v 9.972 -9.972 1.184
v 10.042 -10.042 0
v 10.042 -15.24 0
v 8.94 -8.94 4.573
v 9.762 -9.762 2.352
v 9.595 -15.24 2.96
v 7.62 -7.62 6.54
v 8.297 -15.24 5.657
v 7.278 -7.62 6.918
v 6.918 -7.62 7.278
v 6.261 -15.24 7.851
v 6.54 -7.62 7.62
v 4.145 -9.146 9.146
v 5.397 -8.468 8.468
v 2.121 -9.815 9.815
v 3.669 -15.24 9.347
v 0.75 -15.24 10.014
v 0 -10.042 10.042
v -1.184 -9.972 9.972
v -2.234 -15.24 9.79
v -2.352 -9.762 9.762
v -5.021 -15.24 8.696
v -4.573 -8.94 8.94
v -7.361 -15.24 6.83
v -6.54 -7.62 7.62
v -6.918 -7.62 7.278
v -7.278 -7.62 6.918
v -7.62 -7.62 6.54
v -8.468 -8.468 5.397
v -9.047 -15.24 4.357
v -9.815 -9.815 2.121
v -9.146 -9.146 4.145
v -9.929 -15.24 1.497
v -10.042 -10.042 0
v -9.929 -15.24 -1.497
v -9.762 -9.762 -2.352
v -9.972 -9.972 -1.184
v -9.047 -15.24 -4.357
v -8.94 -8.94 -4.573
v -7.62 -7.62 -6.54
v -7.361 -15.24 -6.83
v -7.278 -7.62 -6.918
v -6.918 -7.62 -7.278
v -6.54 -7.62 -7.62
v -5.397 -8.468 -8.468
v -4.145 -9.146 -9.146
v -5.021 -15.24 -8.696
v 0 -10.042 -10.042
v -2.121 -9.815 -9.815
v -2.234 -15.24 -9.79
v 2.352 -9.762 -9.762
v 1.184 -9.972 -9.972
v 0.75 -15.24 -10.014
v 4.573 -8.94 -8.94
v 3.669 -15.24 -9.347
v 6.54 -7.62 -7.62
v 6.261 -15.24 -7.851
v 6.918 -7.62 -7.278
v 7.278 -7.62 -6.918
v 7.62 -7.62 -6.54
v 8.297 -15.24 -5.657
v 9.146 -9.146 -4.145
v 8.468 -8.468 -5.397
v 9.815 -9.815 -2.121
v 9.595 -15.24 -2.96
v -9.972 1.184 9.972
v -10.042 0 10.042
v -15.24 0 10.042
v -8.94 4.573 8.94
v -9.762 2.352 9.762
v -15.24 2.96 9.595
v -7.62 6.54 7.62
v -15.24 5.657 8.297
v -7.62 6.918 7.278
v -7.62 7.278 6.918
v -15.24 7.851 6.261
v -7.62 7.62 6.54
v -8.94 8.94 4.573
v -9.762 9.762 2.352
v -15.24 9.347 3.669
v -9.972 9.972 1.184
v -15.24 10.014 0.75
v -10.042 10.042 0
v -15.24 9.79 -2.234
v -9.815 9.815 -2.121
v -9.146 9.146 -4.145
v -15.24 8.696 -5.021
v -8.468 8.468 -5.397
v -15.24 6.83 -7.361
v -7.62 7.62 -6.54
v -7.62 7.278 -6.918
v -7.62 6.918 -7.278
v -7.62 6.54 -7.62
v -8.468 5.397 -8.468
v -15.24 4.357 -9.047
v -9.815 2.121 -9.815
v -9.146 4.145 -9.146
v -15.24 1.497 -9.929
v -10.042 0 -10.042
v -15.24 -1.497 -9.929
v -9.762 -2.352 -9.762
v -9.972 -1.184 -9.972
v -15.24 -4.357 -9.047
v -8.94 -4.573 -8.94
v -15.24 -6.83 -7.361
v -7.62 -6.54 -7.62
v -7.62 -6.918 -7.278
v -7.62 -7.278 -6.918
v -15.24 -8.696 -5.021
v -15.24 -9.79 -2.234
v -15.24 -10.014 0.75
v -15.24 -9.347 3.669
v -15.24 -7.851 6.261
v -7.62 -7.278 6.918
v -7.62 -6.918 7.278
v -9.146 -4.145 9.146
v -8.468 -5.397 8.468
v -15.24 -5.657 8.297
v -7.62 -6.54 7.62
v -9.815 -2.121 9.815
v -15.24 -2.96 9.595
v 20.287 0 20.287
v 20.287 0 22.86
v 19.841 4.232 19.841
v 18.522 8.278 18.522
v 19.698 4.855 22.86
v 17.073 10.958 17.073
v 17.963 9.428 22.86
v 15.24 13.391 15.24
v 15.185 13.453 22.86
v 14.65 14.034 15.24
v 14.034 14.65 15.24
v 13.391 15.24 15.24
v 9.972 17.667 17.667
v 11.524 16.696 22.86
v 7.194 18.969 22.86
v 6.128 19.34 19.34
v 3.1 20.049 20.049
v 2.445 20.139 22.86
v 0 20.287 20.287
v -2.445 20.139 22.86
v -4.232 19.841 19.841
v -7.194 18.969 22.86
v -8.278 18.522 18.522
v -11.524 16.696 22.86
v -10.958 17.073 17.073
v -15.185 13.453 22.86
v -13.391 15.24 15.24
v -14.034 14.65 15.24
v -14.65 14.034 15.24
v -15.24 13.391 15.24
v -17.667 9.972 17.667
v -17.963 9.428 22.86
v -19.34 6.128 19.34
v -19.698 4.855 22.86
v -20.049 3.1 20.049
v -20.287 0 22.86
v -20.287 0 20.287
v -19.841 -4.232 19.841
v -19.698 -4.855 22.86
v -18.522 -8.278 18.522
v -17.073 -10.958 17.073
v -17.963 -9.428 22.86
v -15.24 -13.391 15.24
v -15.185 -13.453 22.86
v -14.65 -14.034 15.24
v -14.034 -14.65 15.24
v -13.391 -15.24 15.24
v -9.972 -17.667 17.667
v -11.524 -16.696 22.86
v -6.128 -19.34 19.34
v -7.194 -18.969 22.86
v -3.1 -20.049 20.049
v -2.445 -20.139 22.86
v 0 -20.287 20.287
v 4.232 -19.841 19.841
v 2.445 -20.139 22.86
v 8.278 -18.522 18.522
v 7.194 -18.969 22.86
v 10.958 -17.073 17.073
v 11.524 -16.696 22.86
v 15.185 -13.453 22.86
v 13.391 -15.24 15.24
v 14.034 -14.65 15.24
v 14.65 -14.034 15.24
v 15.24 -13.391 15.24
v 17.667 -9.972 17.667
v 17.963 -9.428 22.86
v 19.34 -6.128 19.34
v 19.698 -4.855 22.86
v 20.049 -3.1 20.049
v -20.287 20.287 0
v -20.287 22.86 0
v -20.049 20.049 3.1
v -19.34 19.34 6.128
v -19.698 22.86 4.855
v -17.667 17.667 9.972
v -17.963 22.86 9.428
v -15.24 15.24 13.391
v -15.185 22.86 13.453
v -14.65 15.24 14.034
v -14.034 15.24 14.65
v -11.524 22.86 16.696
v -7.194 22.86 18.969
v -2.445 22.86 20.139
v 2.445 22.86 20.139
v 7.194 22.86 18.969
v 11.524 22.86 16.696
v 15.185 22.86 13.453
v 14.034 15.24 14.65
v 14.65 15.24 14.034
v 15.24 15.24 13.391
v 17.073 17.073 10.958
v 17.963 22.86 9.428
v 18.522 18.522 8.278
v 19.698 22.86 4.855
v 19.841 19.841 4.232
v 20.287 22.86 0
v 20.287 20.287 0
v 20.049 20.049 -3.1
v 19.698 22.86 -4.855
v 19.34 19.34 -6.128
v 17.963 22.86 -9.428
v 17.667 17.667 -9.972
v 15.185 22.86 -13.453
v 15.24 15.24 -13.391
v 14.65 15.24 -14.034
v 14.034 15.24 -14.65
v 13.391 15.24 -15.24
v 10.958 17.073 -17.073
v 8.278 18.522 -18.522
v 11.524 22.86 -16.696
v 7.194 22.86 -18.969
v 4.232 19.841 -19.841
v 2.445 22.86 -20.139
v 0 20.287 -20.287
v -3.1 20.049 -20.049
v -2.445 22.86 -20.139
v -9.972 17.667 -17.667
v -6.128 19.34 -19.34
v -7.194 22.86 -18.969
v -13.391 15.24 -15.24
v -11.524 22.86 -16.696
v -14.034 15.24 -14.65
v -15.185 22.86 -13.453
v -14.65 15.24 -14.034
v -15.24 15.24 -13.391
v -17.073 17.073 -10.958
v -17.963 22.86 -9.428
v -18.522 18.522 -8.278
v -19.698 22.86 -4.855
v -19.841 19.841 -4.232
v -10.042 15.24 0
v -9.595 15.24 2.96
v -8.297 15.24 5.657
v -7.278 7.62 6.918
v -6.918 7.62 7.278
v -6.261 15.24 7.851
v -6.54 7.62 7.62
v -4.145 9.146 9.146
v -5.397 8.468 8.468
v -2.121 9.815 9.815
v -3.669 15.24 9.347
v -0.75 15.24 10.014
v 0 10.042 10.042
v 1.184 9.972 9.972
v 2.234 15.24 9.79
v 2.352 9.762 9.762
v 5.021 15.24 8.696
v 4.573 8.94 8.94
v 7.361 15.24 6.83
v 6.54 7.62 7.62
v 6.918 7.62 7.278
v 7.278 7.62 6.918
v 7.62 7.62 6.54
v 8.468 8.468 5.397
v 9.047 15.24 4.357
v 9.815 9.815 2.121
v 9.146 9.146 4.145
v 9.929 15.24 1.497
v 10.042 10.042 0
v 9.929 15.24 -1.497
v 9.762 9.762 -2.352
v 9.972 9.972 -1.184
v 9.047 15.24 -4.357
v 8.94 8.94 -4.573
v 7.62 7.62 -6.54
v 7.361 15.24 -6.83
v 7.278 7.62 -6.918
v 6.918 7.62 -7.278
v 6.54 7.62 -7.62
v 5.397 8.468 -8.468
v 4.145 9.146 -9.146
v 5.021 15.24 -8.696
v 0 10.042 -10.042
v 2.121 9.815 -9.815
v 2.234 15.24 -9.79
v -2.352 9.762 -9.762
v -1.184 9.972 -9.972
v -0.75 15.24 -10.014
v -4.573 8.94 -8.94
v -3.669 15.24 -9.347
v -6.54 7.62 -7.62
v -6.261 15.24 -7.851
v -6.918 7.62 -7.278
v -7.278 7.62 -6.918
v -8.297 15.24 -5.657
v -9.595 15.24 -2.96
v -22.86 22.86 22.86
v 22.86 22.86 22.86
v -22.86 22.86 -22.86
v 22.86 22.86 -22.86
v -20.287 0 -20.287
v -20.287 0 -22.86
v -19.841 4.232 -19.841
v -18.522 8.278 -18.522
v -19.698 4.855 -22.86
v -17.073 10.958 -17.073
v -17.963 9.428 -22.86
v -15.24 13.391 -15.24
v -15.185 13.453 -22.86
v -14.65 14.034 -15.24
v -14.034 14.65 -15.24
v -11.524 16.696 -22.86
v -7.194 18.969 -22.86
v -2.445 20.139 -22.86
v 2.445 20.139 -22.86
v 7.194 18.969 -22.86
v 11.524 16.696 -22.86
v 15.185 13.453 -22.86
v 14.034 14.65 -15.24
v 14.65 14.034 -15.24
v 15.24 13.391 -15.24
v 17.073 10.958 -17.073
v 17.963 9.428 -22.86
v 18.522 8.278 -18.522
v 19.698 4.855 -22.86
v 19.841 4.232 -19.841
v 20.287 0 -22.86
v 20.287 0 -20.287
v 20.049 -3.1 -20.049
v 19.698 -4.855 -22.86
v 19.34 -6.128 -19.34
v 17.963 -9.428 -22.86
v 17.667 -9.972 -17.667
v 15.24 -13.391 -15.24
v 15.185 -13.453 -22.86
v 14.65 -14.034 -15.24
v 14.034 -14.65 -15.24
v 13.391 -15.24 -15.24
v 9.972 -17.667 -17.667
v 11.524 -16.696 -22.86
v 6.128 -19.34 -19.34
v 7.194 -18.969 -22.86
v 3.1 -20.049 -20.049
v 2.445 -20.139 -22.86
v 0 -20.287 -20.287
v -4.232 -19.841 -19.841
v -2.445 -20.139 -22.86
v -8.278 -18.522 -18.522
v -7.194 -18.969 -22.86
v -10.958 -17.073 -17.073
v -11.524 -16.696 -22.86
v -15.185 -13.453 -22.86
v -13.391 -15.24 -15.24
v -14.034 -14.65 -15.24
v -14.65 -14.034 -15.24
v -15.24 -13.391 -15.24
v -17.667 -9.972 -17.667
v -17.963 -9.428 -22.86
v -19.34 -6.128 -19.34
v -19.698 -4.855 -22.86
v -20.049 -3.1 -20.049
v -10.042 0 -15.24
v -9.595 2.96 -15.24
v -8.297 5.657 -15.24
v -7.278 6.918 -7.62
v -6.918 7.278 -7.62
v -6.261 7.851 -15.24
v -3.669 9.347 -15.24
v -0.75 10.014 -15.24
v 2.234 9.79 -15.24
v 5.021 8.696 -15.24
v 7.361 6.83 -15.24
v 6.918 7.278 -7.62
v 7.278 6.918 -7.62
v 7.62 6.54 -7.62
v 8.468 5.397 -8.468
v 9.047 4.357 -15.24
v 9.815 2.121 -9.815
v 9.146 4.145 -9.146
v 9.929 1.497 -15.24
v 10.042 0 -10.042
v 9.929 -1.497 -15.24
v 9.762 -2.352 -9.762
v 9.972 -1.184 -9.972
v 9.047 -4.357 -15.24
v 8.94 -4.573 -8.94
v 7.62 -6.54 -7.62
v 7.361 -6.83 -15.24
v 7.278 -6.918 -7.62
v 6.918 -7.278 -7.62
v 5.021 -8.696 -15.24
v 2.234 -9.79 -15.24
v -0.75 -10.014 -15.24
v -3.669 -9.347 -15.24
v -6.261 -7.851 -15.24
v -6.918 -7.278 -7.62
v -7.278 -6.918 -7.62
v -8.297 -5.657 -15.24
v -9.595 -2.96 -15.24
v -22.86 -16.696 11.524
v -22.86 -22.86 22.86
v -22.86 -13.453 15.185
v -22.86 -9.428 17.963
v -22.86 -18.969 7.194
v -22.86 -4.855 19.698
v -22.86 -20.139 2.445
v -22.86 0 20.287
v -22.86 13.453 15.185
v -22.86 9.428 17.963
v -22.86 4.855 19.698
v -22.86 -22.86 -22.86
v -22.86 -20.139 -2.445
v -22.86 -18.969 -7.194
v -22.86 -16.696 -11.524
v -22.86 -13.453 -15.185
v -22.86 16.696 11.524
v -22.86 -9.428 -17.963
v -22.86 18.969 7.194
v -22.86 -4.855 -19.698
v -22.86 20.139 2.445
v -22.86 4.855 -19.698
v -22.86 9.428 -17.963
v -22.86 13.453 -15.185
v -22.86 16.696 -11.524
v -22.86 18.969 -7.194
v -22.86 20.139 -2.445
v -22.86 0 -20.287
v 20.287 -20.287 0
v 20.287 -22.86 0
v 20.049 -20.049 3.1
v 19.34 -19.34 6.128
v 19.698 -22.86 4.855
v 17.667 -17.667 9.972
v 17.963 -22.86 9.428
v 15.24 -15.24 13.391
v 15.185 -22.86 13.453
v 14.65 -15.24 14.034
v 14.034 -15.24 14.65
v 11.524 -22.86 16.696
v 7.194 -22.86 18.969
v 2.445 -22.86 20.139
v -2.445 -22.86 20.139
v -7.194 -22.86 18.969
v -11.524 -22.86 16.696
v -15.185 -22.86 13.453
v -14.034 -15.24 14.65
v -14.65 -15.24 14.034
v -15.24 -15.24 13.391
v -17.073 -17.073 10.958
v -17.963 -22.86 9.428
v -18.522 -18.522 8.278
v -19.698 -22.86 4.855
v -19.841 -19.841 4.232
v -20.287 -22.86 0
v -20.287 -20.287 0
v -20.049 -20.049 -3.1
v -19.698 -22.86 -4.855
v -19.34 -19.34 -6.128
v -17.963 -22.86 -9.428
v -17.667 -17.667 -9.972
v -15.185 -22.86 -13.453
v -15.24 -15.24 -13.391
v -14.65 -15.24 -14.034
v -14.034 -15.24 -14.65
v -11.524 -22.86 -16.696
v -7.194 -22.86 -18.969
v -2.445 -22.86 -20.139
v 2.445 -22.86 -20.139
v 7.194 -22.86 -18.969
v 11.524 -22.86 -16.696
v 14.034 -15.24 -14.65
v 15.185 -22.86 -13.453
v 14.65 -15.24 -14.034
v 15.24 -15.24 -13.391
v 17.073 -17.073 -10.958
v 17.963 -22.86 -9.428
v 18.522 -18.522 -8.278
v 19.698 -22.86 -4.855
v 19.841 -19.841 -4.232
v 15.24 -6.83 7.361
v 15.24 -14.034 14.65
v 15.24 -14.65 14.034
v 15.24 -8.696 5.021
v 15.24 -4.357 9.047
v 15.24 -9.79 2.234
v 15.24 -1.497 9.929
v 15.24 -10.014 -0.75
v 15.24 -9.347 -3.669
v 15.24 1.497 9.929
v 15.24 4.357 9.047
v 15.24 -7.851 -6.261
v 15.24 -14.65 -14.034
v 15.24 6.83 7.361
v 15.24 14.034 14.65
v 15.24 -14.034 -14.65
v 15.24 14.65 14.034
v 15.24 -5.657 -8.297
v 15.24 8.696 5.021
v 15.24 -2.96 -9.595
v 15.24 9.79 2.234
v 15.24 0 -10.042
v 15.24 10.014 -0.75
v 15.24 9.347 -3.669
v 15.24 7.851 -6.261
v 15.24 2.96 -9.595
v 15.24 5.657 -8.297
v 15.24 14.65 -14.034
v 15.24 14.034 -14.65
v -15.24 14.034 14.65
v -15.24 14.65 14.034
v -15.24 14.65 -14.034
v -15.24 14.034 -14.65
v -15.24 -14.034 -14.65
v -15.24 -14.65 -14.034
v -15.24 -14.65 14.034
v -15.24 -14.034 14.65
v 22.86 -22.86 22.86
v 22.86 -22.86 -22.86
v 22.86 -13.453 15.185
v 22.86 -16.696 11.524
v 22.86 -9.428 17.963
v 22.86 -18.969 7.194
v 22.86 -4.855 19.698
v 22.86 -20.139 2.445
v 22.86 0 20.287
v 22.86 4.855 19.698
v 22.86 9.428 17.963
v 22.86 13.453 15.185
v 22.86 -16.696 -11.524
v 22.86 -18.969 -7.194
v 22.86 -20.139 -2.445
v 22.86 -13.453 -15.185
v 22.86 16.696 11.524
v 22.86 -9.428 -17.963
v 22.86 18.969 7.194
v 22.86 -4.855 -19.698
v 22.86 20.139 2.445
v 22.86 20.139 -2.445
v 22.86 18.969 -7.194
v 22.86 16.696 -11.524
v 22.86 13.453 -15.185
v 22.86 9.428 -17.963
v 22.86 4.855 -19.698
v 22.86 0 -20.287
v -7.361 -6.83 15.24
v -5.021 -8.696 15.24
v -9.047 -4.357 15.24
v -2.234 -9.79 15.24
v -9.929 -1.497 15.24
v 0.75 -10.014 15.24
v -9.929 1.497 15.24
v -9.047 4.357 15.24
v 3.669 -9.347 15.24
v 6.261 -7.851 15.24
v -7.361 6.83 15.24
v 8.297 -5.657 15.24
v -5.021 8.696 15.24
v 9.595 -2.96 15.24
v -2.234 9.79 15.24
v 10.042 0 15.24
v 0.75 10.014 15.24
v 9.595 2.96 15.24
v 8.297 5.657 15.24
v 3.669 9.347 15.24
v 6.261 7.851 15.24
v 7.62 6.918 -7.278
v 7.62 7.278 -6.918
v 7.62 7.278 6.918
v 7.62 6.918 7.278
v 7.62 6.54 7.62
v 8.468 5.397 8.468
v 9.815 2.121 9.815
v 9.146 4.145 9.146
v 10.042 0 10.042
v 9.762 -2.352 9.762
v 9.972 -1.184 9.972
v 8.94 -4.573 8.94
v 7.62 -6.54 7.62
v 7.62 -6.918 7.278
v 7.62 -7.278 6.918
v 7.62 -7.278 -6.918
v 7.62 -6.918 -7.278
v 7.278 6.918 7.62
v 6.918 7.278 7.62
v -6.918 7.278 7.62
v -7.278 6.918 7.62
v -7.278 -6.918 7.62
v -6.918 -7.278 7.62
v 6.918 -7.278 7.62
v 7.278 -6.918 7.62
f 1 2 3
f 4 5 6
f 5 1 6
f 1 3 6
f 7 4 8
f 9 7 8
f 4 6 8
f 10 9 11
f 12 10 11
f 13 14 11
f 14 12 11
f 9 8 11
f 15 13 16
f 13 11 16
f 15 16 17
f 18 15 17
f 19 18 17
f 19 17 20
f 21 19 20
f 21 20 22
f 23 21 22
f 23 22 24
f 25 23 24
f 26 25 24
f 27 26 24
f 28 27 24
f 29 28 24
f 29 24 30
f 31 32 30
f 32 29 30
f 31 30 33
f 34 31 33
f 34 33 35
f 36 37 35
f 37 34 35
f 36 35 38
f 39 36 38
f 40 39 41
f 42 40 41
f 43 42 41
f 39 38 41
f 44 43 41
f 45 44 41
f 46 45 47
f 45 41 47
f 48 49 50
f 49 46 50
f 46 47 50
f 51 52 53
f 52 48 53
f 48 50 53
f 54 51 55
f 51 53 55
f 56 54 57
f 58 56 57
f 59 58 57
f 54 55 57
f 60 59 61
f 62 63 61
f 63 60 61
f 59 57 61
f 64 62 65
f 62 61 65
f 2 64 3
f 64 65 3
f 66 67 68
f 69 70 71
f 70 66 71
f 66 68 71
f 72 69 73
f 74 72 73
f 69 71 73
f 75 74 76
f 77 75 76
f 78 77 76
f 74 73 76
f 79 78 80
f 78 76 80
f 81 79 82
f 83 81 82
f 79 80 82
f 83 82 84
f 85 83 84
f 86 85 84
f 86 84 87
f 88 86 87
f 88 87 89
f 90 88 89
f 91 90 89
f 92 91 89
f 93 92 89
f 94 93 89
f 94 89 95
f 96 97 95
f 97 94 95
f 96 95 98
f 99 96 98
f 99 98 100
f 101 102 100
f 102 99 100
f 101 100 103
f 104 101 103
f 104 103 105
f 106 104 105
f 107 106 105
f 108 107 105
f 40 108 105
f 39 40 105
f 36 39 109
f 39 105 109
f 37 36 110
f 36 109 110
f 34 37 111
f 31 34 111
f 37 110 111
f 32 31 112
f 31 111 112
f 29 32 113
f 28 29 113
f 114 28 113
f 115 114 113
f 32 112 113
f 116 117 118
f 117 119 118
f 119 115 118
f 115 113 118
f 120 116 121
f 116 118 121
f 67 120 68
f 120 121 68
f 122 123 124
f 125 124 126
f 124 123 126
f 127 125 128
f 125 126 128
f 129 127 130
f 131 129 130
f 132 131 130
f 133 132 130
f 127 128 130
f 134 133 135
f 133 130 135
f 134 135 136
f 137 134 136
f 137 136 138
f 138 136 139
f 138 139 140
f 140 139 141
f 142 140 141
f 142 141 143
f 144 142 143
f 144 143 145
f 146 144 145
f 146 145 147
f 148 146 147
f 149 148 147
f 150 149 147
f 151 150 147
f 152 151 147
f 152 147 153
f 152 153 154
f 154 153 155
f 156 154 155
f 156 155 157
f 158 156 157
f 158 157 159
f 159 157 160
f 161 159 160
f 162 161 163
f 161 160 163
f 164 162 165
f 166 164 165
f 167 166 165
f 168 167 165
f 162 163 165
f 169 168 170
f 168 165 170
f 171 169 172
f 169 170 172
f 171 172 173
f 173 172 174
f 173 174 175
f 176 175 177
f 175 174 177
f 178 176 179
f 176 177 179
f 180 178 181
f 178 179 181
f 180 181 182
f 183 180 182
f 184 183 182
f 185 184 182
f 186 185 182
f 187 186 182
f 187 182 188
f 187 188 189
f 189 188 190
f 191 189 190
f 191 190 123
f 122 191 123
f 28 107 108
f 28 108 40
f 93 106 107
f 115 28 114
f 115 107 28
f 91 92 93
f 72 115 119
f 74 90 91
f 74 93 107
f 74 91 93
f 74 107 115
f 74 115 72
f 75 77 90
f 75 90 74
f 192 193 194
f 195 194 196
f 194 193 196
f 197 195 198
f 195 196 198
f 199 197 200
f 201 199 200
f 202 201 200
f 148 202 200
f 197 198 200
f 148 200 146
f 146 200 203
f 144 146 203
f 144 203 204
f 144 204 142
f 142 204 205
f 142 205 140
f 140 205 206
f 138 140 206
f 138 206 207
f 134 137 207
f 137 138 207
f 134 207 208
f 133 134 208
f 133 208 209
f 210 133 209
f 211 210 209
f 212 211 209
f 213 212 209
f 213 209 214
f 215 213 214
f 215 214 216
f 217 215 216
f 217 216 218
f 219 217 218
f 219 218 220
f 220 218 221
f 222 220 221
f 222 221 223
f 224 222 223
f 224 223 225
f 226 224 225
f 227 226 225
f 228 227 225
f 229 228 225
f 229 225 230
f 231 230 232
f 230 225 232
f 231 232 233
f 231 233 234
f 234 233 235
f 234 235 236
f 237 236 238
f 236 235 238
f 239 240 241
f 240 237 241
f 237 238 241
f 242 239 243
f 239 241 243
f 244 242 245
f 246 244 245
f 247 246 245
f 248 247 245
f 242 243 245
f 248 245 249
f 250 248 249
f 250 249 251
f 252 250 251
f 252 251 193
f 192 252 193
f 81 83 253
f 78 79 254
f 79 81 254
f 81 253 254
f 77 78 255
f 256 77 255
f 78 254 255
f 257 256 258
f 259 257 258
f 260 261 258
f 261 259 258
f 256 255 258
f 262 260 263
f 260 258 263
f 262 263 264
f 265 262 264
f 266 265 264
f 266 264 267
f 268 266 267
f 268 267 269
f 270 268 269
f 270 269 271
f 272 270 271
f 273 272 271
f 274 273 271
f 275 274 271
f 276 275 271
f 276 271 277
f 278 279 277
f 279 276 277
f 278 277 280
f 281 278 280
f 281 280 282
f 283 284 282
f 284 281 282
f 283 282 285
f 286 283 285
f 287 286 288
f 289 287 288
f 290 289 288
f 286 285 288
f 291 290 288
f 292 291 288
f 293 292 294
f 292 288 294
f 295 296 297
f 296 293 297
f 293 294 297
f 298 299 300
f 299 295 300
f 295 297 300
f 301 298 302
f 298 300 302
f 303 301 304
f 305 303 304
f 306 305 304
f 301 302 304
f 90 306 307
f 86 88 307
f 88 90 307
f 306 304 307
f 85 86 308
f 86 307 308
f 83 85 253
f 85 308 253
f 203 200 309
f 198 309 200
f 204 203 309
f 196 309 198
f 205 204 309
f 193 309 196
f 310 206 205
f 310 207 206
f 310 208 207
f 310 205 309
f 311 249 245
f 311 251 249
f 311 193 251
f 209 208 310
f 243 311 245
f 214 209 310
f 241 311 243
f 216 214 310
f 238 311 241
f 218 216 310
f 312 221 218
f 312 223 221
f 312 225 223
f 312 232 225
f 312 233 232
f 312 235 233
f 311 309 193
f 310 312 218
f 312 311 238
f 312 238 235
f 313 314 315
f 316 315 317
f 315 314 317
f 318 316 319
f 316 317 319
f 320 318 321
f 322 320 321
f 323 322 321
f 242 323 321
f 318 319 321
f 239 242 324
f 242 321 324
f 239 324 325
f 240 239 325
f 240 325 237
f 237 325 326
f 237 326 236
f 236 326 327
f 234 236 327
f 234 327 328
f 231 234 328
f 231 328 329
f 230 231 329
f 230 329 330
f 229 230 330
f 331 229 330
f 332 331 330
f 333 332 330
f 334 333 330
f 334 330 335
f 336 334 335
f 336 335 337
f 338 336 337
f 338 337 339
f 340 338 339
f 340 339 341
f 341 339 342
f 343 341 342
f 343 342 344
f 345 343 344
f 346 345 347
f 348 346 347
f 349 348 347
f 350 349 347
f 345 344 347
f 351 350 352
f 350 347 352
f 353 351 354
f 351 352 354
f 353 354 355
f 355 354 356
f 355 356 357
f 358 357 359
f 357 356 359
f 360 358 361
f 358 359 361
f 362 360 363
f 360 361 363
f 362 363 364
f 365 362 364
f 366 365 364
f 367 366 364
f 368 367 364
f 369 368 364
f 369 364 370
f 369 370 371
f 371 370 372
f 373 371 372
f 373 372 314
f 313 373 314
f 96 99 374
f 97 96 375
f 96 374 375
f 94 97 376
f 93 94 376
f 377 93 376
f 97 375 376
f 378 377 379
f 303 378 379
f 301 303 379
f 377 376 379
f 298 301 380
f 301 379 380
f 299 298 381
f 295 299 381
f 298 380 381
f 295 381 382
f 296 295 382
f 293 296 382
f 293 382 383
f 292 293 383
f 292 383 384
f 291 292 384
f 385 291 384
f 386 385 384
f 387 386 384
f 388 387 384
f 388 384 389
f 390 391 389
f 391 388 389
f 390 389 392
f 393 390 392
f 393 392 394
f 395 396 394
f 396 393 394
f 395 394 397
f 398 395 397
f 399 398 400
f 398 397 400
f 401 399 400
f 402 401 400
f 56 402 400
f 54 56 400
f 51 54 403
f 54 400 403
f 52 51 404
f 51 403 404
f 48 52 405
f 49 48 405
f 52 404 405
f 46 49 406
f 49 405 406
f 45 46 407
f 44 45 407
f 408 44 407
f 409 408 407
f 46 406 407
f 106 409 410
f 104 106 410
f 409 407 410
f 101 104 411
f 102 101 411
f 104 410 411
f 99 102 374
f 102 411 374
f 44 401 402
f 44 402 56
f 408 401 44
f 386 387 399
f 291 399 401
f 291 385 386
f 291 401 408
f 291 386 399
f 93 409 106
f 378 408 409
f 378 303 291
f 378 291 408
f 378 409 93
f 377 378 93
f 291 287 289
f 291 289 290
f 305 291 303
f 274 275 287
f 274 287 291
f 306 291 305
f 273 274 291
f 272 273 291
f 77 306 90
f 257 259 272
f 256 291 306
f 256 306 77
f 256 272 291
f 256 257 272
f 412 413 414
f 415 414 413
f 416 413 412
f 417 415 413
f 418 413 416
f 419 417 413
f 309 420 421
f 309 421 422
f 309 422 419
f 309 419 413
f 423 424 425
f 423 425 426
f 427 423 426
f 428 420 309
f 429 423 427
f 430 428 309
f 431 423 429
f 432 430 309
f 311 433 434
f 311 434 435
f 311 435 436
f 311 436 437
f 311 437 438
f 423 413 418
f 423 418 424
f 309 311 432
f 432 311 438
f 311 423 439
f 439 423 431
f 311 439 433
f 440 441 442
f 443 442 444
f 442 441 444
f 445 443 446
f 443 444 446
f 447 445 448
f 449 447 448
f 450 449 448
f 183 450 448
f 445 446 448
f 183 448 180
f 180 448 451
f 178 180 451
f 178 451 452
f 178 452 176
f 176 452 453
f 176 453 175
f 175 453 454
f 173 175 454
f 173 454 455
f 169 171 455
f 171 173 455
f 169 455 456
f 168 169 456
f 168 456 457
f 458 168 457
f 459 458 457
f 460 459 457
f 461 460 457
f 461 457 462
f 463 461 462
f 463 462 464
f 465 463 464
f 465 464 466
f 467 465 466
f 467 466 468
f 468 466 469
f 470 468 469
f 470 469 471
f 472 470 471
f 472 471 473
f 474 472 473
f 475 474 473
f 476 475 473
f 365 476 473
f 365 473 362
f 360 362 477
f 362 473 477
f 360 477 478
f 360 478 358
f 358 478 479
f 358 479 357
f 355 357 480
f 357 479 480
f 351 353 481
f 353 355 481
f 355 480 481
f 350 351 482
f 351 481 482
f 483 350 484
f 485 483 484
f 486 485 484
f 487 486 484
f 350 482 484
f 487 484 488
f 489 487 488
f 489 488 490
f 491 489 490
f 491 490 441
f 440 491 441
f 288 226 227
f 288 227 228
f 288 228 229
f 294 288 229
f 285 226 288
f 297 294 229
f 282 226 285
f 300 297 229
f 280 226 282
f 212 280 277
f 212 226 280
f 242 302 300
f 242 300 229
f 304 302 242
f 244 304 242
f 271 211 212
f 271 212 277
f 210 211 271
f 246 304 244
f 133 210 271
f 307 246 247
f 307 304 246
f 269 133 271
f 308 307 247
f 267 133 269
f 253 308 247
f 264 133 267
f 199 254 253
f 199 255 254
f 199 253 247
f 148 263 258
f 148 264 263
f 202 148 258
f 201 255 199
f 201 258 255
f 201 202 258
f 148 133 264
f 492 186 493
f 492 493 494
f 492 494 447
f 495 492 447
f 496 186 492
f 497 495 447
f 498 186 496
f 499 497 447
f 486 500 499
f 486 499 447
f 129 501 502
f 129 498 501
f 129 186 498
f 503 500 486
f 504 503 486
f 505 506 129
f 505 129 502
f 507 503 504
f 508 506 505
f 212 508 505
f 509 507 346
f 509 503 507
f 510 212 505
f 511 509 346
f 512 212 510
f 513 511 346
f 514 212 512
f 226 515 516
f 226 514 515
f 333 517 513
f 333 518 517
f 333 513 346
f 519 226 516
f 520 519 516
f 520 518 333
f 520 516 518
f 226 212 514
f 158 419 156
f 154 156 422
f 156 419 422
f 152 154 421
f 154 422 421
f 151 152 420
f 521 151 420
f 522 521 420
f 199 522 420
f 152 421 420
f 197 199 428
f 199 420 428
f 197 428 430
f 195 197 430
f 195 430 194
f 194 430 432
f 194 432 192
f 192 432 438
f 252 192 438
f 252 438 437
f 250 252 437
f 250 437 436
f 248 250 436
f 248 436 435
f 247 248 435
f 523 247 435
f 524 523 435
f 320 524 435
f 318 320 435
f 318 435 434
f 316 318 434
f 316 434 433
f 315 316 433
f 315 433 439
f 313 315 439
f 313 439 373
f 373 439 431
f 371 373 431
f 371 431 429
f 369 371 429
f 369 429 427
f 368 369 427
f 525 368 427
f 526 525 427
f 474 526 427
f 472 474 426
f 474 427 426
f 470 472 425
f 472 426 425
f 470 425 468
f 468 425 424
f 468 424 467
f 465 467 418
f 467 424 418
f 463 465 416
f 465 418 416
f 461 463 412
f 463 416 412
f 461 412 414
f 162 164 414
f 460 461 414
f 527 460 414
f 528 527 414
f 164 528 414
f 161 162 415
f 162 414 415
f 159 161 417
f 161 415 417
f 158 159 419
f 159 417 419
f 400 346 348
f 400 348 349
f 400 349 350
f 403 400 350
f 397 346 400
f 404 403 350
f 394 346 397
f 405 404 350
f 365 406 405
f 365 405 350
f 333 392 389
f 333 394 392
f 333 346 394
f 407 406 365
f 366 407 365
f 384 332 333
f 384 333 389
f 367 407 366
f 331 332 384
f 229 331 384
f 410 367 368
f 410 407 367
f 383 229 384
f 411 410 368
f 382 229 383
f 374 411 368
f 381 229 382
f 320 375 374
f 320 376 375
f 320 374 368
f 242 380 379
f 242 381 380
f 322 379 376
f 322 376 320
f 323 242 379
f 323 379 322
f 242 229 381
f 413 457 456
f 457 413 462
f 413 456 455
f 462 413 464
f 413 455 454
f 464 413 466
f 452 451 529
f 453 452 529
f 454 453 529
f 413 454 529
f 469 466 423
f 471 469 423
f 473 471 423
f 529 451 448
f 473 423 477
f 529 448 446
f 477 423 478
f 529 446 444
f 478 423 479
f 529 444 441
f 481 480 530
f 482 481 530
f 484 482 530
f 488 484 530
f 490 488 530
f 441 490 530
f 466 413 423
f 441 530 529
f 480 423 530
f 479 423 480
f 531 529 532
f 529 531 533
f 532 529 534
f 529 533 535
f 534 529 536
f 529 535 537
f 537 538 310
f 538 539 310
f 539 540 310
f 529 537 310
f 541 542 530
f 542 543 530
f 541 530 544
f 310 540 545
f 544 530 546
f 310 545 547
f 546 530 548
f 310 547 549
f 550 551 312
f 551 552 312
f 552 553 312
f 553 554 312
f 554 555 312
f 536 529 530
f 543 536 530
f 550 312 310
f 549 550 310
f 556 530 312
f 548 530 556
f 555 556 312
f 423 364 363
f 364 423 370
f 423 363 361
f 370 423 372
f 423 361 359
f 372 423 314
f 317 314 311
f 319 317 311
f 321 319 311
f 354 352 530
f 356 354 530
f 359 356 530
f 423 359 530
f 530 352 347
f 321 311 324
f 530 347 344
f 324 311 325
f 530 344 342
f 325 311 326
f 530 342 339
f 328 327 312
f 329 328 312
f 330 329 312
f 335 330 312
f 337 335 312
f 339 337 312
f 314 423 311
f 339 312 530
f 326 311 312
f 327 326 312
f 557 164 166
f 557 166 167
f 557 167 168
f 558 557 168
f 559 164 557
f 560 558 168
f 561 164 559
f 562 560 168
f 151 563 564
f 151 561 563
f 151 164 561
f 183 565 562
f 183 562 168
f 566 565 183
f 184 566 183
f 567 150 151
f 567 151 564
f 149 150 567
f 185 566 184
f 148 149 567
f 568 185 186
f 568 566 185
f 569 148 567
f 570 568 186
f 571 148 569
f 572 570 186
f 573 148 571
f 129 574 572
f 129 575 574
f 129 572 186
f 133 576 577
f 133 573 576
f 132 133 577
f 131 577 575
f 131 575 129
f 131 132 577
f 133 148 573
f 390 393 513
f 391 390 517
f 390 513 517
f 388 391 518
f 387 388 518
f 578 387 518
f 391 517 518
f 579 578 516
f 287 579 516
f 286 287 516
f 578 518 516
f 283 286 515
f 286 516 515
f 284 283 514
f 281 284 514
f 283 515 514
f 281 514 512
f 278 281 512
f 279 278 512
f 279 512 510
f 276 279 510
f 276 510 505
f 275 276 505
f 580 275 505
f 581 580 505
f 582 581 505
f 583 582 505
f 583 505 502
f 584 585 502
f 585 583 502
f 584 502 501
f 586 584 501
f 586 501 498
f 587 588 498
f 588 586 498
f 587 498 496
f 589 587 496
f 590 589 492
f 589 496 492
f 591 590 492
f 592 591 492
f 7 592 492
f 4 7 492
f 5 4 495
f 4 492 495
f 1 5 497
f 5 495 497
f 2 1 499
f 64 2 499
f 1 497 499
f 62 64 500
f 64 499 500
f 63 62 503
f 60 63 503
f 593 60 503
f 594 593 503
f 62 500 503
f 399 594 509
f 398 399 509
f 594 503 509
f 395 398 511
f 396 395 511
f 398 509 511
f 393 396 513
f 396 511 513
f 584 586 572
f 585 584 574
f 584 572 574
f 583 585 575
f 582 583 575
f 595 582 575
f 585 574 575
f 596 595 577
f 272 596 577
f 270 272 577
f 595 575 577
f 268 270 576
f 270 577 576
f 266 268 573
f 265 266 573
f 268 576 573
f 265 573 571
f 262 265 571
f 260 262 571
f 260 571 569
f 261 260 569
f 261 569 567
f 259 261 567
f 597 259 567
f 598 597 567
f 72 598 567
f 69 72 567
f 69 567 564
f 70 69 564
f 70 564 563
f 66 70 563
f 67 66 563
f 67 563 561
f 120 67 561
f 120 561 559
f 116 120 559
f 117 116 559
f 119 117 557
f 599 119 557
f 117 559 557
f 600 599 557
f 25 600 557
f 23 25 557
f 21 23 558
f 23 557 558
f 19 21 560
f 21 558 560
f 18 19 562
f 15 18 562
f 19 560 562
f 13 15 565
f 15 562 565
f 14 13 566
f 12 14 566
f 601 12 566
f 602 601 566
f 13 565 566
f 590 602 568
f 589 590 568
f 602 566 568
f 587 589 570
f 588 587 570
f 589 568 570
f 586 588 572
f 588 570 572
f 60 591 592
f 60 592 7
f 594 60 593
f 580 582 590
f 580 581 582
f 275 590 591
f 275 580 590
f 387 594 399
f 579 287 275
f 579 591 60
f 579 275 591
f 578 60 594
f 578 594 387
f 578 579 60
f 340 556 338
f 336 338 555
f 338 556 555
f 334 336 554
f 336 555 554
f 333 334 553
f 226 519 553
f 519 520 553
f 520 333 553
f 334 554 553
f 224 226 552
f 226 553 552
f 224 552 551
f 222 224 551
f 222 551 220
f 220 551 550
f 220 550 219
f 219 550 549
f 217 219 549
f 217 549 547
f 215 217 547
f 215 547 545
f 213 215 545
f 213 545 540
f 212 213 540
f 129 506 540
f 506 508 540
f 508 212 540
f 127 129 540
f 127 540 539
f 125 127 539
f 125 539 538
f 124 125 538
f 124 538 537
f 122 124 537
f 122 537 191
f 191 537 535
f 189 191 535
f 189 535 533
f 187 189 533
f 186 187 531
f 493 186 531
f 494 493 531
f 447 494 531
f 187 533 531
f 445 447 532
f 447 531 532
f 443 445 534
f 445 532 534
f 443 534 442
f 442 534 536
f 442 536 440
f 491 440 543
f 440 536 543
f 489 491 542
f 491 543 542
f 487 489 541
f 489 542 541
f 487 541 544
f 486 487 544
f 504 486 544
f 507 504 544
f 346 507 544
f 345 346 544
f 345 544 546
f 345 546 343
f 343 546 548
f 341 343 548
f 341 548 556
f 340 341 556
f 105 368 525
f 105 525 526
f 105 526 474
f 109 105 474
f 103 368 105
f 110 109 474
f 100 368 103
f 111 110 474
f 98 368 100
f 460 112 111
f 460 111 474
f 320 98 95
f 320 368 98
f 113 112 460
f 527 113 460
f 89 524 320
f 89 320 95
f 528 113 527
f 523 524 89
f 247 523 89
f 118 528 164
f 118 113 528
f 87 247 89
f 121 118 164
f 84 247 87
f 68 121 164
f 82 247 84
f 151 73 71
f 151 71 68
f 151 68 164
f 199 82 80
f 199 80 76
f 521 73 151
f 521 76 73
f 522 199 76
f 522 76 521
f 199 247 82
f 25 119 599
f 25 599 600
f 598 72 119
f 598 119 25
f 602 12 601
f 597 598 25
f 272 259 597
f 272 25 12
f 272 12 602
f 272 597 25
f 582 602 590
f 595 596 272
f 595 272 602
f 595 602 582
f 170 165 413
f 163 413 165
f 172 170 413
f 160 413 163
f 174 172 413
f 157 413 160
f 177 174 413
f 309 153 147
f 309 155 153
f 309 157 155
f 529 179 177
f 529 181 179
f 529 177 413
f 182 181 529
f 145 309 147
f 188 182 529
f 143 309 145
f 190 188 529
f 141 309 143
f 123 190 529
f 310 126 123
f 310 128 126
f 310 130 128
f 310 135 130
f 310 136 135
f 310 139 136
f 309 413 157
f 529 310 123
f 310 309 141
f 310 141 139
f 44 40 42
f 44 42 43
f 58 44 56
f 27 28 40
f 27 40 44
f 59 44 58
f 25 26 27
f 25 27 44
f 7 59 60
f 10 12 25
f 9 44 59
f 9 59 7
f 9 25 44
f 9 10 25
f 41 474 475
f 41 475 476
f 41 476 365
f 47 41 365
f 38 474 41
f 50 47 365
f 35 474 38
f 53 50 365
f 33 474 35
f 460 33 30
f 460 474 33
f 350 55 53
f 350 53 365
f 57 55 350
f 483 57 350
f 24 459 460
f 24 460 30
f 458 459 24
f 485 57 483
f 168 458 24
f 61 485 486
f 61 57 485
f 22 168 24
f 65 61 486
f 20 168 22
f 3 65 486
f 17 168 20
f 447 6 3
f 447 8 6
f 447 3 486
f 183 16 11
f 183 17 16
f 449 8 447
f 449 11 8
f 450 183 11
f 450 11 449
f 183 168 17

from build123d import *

# Parameters (mm, degrees)
BOSS_EXTRUDE1_DEPTH         = 22.86
BOSS_EXTRUDE1_DEPTH_BACK    = 22.86
SKETCH1_W                   = 45.72
SKETCH1_H                   = 45.72
SKETCH4_R                   = 20.287199642
CUT_EXTRUDE1_DEPTH          = 7.62
SKETCH5_R                   = 10.041617815
CUT_EXTRUDE2_DEPTH          = 15.24
CIRPATTERN1_COUNT           = 4
CIRPATTERN2_COPY_1_SKETCH_R = 20.287199642
CIRPATTERN2_COPY_1_DEPTH    = 7.62
CIRPATTERN2_COPY_2_SKETCH_R = 20.287199642
CIRPATTERN2_COPY_2_DEPTH    = 7.62
CIRPATTERN2_COPY_3_SKETCH_R = 20.287199642
CIRPATTERN2_COPY_3_DEPTH    = 7.62
CIRPATTERN2_COPY_4_SKETCH_R = 10.041617815
CIRPATTERN2_COPY_4_DEPTH    = 15.24
CIRPATTERN2_COPY_5_SKETCH_R = 10.041617815
CIRPATTERN2_COPY_5_DEPTH    = 15.24
CIRPATTERN2_COPY_6_SKETCH_R = 10.041617815
CIRPATTERN2_COPY_6_DEPTH    = 15.24
CIRPATTERN2_COPY_7_SKETCH_R = 20.287199642
CIRPATTERN2_COPY_7_DEPTH    = 7.62
CIRPATTERN2_COPY_8_SKETCH_R = 10.041617815
CIRPATTERN2_COPY_8_DEPTH    = 15.24


with BuildPart() as part:
    # Sketch1 → Boss-Extrude1 (new, two sides: drawn at the far end of the back side and taken through both)
    with BuildSketch(Plane.XY.offset(-BOSS_EXTRUDE1_DEPTH_BACK)):
        Rectangle(SKETCH1_W, SKETCH1_H)
    extrude(amount=BOSS_EXTRUDE1_DEPTH + BOSS_EXTRUDE1_DEPTH_BACK)

    # Sketch4 → Cut-Extrude1 (cut)
    with BuildSketch(Plane.XY.offset(22.86)):
        Circle(SKETCH4_R)
    cut_extrude1 = extrude(amount=-CUT_EXTRUDE1_DEPTH, mode=Mode.SUBTRACT)

    # Sketch5 → Cut-Extrude2 (cut)
    with BuildSketch(Plane.XY.offset(22.86)):
        Circle(SKETCH5_R)
    cut_extrude2 = extrude(amount=-CUT_EXTRUDE2_DEPTH, mode=Mode.SUBTRACT)

    # CirPattern1: Cut-Extrude1, Cut-Extrude2 ×4 about axis
    cirpattern1_axis = Axis((0, 25.146, 0), (0, -1, 0))
    add([cut_extrude1.rotate(cirpattern1_axis, i * 360 / CIRPATTERN1_COUNT) for i in range(1, CIRPATTERN1_COUNT)], mode=Mode.SUBTRACT)
    add([cut_extrude2.rotate(cirpattern1_axis, i * 360 / CIRPATTERN1_COUNT) for i in range(1, CIRPATTERN1_COUNT)], mode=Mode.SUBTRACT)

    # CirPattern2 copy 1 sketch → CirPattern2 copy 1 (cut)
    with BuildSketch(Plane(origin=(-22.86, 0, 0), x_dir=(0, -1, 0), z_dir=(-1, 0, 0))):
        Circle(CIRPATTERN2_COPY_1_SKETCH_R)
    extrude(amount=-CIRPATTERN2_COPY_1_DEPTH, mode=Mode.SUBTRACT)

    # CirPattern2 copy 2 sketch → CirPattern2 copy 2 (cut)
    with BuildSketch(Plane(origin=(0, 22.86, 0), x_dir=(-1, 0, 0), z_dir=(0, 1, 0))):
        Circle(CIRPATTERN2_COPY_2_SKETCH_R)
    extrude(amount=-CIRPATTERN2_COPY_2_DEPTH, mode=Mode.SUBTRACT)

    # CirPattern2 copy 3 sketch → CirPattern2 copy 3 (cut)
    with BuildSketch(Plane.YZ.offset(22.86)):
        Circle(CIRPATTERN2_COPY_3_SKETCH_R)
    extrude(amount=-CIRPATTERN2_COPY_3_DEPTH, mode=Mode.SUBTRACT)

    # CirPattern2 copy 4 sketch → CirPattern2 copy 4 (cut)
    with BuildSketch(Plane(origin=(-22.86, 0, 0), x_dir=(0, -1, 0), z_dir=(-1, 0, 0))):
        Circle(CIRPATTERN2_COPY_4_SKETCH_R)
    extrude(amount=-CIRPATTERN2_COPY_4_DEPTH, mode=Mode.SUBTRACT)

    # CirPattern2 copy 5 sketch → CirPattern2 copy 5 (cut)
    with BuildSketch(Plane(origin=(0, 22.86, 0), x_dir=(-1, 0, 0), z_dir=(0, 1, 0))):
        Circle(CIRPATTERN2_COPY_5_SKETCH_R)
    extrude(amount=-CIRPATTERN2_COPY_5_DEPTH, mode=Mode.SUBTRACT)

    # CirPattern2 copy 6 sketch → CirPattern2 copy 6 (cut)
    with BuildSketch(Plane.YZ.offset(22.86)):
        Circle(CIRPATTERN2_COPY_6_SKETCH_R)
    extrude(amount=-CIRPATTERN2_COPY_6_DEPTH, mode=Mode.SUBTRACT)

    # CirPattern2 copy 7 sketch → CirPattern2 copy 7 (cut)
    with BuildSketch(Plane.XZ.offset(22.86)):
        Circle(CIRPATTERN2_COPY_7_SKETCH_R)
    extrude(amount=-CIRPATTERN2_COPY_7_DEPTH, mode=Mode.SUBTRACT)

    # CirPattern2 copy 8 sketch → CirPattern2 copy 8 (cut)
    with BuildSketch(Plane.XZ.offset(22.86)):
        Circle(CIRPATTERN2_COPY_8_SKETCH_R)
    extrude(amount=-CIRPATTERN2_COPY_8_DEPTH, mode=Mode.SUBTRACT)


solid = part.part
